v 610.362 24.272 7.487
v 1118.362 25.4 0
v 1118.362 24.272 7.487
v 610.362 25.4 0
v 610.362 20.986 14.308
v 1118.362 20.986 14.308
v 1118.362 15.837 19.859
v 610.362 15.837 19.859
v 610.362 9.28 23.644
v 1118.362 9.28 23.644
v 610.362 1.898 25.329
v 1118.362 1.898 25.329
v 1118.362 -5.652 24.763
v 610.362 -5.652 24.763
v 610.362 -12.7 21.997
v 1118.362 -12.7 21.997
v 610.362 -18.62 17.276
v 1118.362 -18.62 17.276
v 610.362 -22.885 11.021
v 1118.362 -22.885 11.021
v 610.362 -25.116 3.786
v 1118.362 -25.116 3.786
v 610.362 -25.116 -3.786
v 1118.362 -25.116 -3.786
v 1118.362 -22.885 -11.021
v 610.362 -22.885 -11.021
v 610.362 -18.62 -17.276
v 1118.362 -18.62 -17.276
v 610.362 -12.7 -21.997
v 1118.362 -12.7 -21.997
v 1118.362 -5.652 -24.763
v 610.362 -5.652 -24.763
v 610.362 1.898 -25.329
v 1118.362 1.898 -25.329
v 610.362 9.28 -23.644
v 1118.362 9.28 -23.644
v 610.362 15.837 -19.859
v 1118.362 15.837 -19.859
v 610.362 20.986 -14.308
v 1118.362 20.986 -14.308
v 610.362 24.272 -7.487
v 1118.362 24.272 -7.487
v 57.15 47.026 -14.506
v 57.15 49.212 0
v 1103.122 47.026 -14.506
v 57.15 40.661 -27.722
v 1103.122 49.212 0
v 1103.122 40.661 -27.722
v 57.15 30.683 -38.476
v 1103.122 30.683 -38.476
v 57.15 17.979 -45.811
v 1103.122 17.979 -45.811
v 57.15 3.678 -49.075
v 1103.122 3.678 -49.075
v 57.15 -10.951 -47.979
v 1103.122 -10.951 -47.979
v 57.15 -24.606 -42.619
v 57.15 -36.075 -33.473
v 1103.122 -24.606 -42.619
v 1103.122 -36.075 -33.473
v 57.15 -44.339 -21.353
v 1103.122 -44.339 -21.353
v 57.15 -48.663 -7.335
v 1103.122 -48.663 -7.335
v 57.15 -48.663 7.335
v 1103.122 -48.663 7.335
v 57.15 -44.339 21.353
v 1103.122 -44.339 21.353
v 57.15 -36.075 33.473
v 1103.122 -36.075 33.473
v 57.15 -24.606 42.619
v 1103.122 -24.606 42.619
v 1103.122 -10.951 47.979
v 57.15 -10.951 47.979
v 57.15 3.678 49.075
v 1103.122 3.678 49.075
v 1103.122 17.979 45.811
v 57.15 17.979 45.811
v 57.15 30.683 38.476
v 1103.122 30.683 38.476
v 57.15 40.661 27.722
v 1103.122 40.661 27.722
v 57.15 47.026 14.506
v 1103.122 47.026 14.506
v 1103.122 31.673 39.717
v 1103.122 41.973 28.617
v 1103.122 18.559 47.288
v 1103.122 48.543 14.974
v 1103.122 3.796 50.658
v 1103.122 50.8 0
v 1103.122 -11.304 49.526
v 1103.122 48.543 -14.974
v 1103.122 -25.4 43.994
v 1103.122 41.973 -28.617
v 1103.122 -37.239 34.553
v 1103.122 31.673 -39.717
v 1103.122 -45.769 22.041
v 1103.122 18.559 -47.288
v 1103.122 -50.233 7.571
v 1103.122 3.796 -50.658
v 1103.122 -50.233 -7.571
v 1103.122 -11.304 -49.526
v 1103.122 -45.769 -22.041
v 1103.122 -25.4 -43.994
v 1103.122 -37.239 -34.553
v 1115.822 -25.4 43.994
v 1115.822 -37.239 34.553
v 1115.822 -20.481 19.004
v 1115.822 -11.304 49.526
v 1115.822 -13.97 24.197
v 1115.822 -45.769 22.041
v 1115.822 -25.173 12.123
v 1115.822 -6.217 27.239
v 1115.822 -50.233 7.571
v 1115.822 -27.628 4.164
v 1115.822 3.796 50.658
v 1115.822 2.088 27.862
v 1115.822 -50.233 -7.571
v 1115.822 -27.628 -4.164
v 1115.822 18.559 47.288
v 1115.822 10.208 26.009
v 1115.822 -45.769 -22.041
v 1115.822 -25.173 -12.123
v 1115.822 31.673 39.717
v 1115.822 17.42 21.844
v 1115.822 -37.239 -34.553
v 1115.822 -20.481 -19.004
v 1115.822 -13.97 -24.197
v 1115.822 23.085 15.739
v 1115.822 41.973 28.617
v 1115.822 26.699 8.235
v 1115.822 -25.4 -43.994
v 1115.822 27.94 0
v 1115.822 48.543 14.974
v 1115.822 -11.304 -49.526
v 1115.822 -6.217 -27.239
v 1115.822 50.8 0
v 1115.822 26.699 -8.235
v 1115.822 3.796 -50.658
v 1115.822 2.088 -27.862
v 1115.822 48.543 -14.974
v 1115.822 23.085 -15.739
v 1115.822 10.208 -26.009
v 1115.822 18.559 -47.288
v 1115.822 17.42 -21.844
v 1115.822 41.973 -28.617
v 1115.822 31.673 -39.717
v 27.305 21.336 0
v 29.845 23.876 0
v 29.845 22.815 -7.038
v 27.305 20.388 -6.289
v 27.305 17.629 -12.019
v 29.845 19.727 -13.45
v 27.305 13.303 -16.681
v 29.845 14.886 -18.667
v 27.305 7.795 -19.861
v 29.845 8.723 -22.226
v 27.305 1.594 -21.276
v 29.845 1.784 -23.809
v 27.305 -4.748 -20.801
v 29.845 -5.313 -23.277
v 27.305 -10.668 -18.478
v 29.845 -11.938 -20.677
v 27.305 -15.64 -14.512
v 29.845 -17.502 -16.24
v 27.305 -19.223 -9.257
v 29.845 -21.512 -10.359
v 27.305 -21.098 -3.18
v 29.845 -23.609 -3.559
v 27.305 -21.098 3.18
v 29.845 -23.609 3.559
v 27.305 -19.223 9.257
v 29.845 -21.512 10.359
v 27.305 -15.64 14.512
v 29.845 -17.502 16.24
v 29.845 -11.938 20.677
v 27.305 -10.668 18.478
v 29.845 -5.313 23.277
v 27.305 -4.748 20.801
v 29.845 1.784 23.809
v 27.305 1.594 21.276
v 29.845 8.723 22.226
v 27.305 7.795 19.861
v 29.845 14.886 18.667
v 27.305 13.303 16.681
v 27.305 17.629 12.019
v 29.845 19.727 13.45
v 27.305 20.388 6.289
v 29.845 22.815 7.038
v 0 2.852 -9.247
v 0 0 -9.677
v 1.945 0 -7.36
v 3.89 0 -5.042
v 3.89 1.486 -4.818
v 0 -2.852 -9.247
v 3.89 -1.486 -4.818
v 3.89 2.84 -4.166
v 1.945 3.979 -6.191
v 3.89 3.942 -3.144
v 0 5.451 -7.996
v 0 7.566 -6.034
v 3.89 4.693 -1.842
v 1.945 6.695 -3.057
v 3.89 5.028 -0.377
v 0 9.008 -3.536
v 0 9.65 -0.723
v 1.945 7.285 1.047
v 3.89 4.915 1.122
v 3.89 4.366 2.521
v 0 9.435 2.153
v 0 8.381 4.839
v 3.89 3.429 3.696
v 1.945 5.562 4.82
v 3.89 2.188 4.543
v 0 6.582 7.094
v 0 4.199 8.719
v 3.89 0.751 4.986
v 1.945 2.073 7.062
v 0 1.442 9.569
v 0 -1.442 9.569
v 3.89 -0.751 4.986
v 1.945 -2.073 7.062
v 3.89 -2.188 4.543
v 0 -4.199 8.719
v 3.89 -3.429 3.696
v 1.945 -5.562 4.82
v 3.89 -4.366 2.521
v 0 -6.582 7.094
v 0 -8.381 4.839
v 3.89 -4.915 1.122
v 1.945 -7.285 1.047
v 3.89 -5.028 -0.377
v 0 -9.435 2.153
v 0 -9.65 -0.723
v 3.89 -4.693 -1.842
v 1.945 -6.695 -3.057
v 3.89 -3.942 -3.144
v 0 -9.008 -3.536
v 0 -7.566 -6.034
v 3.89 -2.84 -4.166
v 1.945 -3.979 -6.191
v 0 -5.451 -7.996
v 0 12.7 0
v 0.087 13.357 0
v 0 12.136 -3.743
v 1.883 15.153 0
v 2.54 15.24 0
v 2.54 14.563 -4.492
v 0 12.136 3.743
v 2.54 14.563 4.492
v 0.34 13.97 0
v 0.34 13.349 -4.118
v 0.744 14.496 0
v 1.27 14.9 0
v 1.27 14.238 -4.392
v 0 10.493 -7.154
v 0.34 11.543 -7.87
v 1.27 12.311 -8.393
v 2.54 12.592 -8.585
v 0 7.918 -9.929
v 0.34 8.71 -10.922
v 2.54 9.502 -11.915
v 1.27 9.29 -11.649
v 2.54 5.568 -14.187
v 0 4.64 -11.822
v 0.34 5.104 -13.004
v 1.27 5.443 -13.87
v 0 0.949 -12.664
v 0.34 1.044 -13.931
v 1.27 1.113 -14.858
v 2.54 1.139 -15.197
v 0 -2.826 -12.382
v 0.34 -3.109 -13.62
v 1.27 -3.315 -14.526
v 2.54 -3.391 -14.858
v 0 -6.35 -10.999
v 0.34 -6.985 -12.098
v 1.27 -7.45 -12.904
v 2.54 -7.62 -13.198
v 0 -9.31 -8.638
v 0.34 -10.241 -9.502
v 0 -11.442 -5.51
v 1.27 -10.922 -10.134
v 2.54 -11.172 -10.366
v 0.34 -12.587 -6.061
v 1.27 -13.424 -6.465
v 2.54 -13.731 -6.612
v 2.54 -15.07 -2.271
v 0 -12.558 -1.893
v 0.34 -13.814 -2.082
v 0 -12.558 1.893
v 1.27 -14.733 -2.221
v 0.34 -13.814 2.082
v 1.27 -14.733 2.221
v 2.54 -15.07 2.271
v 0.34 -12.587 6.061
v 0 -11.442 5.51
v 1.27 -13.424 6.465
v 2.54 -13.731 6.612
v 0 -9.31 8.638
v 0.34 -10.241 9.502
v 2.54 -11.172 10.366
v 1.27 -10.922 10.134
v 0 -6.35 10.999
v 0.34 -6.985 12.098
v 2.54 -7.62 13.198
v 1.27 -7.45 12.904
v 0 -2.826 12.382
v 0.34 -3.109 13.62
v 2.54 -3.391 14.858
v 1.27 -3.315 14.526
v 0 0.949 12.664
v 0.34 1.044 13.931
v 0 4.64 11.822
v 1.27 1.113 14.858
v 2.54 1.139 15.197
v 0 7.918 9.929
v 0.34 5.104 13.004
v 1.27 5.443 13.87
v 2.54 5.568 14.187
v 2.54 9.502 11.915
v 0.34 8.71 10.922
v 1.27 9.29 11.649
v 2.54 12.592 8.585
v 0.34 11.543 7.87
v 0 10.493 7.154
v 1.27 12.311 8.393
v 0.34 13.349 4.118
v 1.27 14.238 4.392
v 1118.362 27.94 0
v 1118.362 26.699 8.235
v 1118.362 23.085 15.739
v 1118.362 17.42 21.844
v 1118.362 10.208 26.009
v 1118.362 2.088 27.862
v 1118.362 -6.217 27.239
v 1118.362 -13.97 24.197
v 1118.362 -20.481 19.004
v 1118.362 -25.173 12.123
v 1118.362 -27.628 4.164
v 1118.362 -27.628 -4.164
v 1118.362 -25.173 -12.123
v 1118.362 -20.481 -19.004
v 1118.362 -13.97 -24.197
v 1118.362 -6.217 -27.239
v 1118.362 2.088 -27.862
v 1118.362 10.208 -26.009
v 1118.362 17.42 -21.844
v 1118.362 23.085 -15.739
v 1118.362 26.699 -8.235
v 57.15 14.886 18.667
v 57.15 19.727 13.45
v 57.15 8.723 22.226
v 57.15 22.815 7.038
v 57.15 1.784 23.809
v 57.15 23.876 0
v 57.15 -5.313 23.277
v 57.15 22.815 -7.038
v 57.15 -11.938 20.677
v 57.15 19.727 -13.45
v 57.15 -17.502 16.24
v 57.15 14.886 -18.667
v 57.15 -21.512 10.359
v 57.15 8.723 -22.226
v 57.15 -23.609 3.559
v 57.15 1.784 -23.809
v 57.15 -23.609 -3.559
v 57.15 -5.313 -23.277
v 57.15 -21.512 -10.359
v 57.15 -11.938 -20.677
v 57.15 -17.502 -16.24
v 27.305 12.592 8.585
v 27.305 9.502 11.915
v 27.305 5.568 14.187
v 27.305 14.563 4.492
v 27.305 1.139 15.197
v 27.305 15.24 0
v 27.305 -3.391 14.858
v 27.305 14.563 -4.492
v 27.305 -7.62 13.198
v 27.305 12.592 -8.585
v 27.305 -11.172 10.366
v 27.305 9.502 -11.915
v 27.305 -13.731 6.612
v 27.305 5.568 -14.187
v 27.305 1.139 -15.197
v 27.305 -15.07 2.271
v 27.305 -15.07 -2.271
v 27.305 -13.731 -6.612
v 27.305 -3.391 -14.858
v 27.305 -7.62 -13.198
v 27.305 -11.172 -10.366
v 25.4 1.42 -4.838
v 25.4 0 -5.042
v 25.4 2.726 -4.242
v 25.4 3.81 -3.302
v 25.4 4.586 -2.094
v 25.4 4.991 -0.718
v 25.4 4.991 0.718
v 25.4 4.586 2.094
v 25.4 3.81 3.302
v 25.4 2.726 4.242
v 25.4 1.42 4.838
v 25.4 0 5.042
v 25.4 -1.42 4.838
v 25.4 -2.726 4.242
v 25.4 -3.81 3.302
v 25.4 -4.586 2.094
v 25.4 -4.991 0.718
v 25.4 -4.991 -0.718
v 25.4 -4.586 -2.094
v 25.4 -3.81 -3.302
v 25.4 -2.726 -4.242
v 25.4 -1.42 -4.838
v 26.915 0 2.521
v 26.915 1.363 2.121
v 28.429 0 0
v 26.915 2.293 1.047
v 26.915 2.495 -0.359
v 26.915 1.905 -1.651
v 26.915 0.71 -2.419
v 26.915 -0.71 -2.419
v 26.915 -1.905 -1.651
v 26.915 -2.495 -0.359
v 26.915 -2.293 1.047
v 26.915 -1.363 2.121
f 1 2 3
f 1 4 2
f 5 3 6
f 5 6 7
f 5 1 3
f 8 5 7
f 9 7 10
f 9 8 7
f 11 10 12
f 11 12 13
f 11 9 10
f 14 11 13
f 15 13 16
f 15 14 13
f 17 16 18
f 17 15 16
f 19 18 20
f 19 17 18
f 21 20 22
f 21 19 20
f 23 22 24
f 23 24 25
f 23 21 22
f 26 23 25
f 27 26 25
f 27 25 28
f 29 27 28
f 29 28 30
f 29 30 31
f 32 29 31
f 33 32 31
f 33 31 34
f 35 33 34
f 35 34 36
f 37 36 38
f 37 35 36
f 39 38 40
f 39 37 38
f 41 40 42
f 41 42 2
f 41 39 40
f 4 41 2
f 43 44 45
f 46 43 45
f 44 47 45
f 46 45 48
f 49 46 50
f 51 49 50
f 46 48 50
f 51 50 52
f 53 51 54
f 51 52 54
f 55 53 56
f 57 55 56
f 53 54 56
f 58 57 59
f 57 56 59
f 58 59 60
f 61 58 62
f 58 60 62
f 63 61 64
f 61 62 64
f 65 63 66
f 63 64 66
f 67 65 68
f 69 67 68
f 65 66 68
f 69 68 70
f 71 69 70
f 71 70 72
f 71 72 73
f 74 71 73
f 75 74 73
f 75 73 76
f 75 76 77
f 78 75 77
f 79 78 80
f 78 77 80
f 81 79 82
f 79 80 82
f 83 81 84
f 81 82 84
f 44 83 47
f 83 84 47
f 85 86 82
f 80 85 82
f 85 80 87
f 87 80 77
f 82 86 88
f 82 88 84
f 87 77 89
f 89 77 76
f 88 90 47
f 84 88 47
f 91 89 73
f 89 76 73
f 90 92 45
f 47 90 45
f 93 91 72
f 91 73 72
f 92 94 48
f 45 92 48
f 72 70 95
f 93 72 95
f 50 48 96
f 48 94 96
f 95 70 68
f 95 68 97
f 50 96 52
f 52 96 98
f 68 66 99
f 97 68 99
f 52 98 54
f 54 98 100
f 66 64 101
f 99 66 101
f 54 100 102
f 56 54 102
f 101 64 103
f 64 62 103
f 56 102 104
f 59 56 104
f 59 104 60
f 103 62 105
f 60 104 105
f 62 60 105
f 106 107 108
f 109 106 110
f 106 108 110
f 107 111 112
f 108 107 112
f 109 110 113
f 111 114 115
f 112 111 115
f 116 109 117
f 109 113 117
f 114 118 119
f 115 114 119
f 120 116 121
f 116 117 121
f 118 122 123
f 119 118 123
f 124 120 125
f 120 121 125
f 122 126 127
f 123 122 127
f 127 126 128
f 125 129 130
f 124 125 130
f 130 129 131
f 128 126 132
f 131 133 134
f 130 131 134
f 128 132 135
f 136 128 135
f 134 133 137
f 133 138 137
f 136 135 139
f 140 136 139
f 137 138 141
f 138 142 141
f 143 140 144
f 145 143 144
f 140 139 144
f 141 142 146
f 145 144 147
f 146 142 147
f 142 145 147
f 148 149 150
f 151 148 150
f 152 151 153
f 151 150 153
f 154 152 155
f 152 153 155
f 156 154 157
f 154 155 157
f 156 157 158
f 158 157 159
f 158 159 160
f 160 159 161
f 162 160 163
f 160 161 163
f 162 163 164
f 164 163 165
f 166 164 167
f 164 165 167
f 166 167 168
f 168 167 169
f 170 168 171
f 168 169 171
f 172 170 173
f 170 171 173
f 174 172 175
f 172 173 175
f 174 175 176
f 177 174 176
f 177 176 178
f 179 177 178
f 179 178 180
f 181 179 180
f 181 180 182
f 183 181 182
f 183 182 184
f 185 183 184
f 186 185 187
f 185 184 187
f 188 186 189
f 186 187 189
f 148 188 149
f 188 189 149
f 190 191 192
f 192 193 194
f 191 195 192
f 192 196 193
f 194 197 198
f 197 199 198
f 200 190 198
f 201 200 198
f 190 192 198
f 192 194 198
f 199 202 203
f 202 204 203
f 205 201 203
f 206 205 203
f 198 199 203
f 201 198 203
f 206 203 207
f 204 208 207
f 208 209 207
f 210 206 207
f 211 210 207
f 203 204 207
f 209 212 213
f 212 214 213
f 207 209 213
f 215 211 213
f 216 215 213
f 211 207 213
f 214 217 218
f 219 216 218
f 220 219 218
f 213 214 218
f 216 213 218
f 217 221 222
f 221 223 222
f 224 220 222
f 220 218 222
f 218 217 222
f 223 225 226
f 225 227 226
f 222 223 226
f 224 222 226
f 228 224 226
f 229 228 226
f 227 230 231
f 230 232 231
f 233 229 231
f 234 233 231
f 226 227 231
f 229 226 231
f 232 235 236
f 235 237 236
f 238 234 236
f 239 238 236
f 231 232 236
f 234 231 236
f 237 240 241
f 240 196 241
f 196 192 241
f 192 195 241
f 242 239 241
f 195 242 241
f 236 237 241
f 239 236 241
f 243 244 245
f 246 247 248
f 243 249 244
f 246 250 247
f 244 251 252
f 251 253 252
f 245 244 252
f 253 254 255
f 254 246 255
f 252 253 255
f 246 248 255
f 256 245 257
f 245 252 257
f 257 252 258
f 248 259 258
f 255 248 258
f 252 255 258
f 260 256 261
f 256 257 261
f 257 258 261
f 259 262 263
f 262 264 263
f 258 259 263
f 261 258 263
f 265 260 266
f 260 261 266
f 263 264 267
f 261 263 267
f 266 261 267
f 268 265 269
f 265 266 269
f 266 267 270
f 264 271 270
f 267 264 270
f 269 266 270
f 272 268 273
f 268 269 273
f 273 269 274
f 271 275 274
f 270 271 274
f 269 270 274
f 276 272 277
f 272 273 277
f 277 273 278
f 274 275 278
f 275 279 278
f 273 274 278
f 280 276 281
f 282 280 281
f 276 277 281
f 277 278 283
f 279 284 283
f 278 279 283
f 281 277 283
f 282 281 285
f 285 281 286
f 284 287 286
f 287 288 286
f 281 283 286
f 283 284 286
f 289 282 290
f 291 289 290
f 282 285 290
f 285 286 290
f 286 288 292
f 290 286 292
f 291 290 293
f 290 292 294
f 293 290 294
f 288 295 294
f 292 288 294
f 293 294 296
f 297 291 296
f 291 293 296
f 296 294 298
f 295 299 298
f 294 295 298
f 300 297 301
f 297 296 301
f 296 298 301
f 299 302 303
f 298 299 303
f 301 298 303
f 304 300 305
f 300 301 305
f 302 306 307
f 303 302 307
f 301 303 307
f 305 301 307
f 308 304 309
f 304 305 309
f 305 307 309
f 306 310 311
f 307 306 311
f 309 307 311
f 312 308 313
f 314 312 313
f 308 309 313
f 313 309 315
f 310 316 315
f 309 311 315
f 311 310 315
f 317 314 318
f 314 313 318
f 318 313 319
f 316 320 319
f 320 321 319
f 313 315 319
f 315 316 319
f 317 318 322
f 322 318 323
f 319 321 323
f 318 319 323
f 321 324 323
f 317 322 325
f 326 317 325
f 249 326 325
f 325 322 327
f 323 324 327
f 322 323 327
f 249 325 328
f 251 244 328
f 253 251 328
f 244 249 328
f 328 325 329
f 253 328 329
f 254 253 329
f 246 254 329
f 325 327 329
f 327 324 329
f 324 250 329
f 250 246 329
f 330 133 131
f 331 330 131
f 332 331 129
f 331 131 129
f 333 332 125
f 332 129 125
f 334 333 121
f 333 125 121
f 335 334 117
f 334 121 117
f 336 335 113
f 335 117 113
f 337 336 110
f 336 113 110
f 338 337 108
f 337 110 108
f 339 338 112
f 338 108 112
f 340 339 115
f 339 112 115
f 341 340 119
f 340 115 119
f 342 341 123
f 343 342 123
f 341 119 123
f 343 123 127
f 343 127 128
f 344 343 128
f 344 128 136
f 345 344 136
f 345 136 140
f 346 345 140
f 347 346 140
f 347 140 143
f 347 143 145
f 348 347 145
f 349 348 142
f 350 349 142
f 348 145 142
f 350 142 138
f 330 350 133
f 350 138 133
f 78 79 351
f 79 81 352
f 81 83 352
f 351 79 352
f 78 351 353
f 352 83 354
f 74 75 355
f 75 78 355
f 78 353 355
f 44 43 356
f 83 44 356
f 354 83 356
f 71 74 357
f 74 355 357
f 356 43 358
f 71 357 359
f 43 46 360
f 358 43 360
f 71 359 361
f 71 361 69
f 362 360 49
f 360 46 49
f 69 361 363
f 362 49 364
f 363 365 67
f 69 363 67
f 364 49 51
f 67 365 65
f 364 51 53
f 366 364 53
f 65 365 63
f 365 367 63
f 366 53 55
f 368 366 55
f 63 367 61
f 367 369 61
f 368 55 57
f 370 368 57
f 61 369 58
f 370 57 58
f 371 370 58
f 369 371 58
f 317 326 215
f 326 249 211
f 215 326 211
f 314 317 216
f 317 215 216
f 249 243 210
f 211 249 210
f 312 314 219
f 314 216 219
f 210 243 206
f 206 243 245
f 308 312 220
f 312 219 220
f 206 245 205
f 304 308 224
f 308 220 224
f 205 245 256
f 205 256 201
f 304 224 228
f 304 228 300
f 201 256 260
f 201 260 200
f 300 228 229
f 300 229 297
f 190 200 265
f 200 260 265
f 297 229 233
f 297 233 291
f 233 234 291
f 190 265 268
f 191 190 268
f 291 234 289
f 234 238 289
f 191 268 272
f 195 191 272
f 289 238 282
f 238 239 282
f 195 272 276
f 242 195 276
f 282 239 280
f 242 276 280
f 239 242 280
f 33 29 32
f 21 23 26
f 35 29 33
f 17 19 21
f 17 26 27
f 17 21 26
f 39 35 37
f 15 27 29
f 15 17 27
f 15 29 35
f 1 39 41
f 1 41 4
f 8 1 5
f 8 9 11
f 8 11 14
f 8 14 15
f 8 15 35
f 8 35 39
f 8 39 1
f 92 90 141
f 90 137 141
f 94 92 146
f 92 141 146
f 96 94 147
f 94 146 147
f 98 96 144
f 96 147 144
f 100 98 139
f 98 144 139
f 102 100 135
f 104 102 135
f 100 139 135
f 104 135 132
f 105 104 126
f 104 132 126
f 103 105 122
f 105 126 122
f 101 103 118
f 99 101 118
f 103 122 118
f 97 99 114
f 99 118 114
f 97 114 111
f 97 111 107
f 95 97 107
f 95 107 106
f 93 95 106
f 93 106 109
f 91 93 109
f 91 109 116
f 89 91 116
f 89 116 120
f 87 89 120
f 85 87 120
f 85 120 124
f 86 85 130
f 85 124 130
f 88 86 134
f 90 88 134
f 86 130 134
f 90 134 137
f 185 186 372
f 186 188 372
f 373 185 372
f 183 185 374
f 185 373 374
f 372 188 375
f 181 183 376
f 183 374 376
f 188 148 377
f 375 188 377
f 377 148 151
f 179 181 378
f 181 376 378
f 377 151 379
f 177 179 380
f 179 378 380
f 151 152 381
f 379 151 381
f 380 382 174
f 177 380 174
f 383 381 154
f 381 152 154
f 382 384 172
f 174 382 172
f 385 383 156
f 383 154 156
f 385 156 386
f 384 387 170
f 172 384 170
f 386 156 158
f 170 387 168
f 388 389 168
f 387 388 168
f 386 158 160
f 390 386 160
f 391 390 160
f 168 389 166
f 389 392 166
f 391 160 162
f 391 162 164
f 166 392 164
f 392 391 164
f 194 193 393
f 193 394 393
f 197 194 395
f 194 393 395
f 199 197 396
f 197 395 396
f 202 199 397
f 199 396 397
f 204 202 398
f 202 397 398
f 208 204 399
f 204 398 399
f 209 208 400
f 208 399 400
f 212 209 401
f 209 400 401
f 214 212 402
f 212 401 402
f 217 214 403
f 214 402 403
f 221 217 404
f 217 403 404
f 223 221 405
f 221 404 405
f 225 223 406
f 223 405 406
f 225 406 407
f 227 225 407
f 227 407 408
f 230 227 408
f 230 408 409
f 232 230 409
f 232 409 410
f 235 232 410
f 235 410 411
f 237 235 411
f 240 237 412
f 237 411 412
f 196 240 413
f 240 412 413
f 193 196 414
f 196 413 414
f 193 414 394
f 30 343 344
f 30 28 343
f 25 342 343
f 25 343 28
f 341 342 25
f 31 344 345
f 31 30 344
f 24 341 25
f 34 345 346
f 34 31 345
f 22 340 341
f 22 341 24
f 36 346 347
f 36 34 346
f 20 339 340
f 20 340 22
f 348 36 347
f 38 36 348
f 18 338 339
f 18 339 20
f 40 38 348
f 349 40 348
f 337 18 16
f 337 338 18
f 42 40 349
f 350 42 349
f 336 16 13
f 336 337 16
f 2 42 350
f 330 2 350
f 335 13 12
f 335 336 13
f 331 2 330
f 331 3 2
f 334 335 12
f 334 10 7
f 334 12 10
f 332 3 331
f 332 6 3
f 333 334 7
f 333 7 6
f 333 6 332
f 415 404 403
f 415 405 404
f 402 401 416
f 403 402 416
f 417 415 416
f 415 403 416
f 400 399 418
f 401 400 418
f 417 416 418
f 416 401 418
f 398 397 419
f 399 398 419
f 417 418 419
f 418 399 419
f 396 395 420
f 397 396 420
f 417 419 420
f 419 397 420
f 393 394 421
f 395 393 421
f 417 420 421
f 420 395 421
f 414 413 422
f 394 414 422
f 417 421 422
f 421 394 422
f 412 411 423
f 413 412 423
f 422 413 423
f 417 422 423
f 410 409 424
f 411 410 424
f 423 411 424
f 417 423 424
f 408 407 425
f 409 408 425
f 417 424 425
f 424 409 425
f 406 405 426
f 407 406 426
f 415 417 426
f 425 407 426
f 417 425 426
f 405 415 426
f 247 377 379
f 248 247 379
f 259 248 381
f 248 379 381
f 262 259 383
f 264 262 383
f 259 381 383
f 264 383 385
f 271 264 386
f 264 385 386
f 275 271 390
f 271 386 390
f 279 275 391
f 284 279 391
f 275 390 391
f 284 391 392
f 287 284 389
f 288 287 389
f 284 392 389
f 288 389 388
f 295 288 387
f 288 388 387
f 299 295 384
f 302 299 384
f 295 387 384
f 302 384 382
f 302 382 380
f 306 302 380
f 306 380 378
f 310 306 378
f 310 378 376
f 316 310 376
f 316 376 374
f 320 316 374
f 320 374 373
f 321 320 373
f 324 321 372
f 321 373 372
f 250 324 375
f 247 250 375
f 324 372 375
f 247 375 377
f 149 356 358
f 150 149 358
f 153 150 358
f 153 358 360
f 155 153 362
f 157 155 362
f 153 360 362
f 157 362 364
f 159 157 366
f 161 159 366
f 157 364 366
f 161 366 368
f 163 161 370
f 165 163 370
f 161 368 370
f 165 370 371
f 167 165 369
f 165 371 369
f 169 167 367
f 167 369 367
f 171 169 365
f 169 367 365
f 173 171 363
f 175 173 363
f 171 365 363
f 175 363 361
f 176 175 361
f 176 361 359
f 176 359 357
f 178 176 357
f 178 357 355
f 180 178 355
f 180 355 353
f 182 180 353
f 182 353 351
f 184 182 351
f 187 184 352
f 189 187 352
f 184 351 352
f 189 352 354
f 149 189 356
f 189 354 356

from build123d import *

# Parameters (mm, degrees)
CSK_FOR_3_8_FLAT_HEAD_MACHINE_SCREW_100_D           = 10.0838
CSK_FOR_3_8_FLAT_HEAD_MACHINE_SCREW_100_DEPTH       = 25.4
CSK_FOR_3_8_FLAT_HEAD_MACHINE_SCREW_100_CSINK_D     = 19.3548
CSK_FOR_3_8_FLAT_HEAD_MACHINE_SCREW_100_CSINK_ANGLE = 100
CSK_FOR_3_8_FLAT_HEAD_MACHINE_SCREW_100_TIP         = 3.029479155
FILLET1_R                                           = 2.54
CHAMFER1_SIZE                                       = 2.54
SKETCH4_R                                           = 27.94
SKETCH4_R_2                                         = 25.4
BOSS_EXTRUDE1_DEPTH                                 = 2.54
CUT_EXTRUDE1_START                                  = -508
SKETCH5_R                                           = 25.4
CUT_EXTRUDE1_DEPTH                                  = 508


with BuildPart() as part:
    # Sketch1 → Revolve1 (revolve)
    with BuildSketch(Plane.XY):
        Polygon((0, 0), (0, 15.24), (27.305, 15.24), (27.305, 23.876), (57.15, 23.876), (57.15, 49.2125), (1103.122, 49.2125), (1103.122, 50.8), (1115.822, 50.8), (1115.822, 0), align=None)
    revolve(axis=Axis((1115.822, 0, 0), (-1, 0, 0)))

    # CSK for 3/8 Flat Head Machine Screw (100)1
    with Locations(Plane.ZY):
        with Locations((0, 0)):
            CounterSinkHole(CSK_FOR_3_8_FLAT_HEAD_MACHINE_SCREW_100_D / 2, CSK_FOR_3_8_FLAT_HEAD_MACHINE_SCREW_100_CSINK_D / 2, depth=CSK_FOR_3_8_FLAT_HEAD_MACHINE_SCREW_100_DEPTH, counter_sink_angle=CSK_FOR_3_8_FLAT_HEAD_MACHINE_SCREW_100_CSINK_ANGLE)
            with Locations((0, 0, -(CSK_FOR_3_8_FLAT_HEAD_MACHINE_SCREW_100_DEPTH + CSK_FOR_3_8_FLAT_HEAD_MACHINE_SCREW_100_TIP / 2))):  # 118° drill point
                Cone(0, CSK_FOR_3_8_FLAT_HEAD_MACHINE_SCREW_100_D / 2, CSK_FOR_3_8_FLAT_HEAD_MACHINE_SCREW_100_TIP, mode=Mode.SUBTRACT)

    # Fillet1
    fillet1_edges = [part.edges().sort_by_distance(p)[0] for p in [
        (0, -15.24, 0),
    ]]
    fillet(fillet1_edges, radius=FILLET1_R)

    # Chamfer1
    chamfer1_edges = [part.edges().sort_by_distance(p)[0] for p in [
        (27.305, -23.876, 0),
    ]]
    chamfer(chamfer1_edges, length=CHAMFER1_SIZE)

    # Sketch4 → Boss-Extrude1 (add)
    with BuildSketch(Plane(origin=(1115.822, 0, 0), x_dir=(0, 0, -1), z_dir=(1, 0, 0))):
        with Locations(Location((0, 0, 0), (0, 0, 90))):
            Circle(SKETCH4_R)
        with Locations(Location((0, 0, 0), (0, 0, 90))):
            Circle(SKETCH4_R_2, mode=Mode.SUBTRACT)
    extrude(amount=BOSS_EXTRUDE1_DEPTH)

    # Sketch5 → Cut-Extrude1 (cut)
    with BuildSketch(Plane(origin=(1118.362, 0, 0), x_dir=(0, 0, -1), z_dir=(1, 0, 0)).offset(CUT_EXTRUDE1_START)):
        with Locations(Location((0, 0, 0), (0, 0, 90))):
            Circle(SKETCH5_R)
    extrude(amount=CUT_EXTRUDE1_DEPTH, mode=Mode.SUBTRACT)


solid = part.part
